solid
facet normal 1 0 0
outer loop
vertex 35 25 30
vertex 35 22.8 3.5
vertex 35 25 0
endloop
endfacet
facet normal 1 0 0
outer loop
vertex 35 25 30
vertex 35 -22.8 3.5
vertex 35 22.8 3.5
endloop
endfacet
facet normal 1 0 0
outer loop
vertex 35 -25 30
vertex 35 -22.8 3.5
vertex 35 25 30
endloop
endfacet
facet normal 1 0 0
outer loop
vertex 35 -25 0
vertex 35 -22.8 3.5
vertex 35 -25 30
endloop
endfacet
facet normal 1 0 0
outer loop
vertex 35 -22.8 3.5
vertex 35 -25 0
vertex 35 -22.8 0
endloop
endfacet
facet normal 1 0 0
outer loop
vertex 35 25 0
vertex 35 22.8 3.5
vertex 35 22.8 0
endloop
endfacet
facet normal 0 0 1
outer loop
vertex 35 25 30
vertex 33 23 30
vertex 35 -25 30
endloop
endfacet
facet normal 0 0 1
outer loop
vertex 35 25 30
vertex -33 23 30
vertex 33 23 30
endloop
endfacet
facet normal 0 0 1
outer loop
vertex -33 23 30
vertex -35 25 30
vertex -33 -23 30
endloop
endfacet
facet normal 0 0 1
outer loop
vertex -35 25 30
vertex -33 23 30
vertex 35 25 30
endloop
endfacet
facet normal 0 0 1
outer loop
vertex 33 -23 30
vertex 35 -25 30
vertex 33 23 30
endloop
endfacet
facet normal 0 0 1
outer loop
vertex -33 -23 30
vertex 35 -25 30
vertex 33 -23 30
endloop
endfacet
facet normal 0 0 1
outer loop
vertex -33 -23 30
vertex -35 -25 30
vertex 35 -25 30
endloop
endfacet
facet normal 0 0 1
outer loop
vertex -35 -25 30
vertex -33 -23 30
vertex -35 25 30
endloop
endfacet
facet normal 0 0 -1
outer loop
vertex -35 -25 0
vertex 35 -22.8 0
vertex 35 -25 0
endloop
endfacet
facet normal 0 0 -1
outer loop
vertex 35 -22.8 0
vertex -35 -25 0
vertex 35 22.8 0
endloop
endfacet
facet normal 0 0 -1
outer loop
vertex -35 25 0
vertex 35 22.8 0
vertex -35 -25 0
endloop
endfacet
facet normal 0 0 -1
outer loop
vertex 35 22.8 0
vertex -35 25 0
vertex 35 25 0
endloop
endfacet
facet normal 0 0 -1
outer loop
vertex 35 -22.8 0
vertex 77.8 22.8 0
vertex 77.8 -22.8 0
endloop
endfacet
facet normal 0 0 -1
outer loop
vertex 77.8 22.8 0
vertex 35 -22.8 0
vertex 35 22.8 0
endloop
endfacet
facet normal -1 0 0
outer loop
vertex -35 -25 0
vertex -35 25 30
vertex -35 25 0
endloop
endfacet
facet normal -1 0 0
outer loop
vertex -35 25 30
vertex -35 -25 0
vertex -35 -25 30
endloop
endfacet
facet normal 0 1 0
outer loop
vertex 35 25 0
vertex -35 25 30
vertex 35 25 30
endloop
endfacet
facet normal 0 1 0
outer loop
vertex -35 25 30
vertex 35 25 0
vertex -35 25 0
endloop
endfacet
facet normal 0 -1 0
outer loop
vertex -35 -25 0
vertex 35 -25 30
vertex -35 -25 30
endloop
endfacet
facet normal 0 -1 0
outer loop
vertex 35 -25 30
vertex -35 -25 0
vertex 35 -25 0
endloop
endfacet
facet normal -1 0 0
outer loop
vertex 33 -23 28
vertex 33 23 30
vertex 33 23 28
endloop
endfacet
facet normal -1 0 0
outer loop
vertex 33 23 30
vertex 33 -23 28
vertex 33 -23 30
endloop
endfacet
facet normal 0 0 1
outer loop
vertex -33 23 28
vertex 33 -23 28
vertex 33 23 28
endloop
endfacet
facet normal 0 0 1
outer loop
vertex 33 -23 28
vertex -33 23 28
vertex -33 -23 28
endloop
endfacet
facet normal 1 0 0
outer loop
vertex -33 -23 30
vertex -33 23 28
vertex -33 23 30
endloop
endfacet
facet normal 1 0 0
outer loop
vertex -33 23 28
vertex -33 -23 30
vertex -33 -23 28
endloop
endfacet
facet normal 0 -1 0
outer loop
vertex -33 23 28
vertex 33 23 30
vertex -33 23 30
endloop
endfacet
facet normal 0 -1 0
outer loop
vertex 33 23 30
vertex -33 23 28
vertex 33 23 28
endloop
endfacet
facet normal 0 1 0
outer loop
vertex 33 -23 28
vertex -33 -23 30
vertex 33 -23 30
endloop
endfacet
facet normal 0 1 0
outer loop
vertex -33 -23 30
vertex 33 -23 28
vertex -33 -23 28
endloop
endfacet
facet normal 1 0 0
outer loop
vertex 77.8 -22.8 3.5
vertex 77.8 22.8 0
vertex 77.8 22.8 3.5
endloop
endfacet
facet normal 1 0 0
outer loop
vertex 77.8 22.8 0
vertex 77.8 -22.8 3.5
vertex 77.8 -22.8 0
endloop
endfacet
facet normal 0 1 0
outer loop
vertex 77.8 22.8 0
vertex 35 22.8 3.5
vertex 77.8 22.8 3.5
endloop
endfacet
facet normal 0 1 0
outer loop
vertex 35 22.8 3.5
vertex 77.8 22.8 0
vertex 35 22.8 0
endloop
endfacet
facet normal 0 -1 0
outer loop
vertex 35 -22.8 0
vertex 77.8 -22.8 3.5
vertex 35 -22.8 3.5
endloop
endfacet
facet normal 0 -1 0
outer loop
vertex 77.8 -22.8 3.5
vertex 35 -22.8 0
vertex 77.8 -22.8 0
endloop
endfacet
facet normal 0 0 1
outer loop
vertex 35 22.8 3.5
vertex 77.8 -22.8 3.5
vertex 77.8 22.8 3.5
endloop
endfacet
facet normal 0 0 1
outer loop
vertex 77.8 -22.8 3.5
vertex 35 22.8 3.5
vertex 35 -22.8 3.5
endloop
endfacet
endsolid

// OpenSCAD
// Two-part enclosure for a small electronics board (e.g., Arduino-based logger)
// Print orientation: box standing on the bed, lid plate flat on the bed.

$fn = 64;

// ---- Dimensions (mm) ----
box_x      = 70;    // box outer length (X)
box_y      = 50;    // box outer width (Y)
box_z      = 30;    // box outer height (Z)
box_wall   = 2;     // box wall thickness
box_floor  = 2;     // box floor thickness

gap        = 10;    // clear gap between the two parts

lip_x      = 65.6;  // lip outer length (X)
lip_y      = 45.6;  // lip outer width (Y)
lip_t      = 1.5;   // lip wall thickness
lip_h      = 4;     // lip height above plate

eps        = 0.5;   // cutter overshoot

// ---- Derived ----
box_inner_x = box_x - 2*box_wall;
box_inner_y = box_y - 2*box_wall;
plate_t     = 2;    // lid plate thickness

// ---- Model ----
union() {
    // Box: open-top container
    difference() {
        translate([-box_x/2, -box_y/2, 0])
            cube([box_x, box_y, box_z]);
        translate([-box_inner_x/2, -box_inner_y/2, box_z - box_wall])
            cube([box_inner_x, box_inner_y, box_wall + eps]);
    }

    // Lid: plate with a rectangular lip that slides into the box opening
    union() {
        translate([(box_x - lip_x)/2 + gap, -lip_y/2, 0])
            cube([lip_x, lip_y, plate_t]);          // base plate
        translate([(box_x - lip_x)/2 + gap, -lip_y/2, plate_t])
            cube([lip_x, lip_y, lip_t]);            // lip (overlaps plate for a clean union)
    }
}
